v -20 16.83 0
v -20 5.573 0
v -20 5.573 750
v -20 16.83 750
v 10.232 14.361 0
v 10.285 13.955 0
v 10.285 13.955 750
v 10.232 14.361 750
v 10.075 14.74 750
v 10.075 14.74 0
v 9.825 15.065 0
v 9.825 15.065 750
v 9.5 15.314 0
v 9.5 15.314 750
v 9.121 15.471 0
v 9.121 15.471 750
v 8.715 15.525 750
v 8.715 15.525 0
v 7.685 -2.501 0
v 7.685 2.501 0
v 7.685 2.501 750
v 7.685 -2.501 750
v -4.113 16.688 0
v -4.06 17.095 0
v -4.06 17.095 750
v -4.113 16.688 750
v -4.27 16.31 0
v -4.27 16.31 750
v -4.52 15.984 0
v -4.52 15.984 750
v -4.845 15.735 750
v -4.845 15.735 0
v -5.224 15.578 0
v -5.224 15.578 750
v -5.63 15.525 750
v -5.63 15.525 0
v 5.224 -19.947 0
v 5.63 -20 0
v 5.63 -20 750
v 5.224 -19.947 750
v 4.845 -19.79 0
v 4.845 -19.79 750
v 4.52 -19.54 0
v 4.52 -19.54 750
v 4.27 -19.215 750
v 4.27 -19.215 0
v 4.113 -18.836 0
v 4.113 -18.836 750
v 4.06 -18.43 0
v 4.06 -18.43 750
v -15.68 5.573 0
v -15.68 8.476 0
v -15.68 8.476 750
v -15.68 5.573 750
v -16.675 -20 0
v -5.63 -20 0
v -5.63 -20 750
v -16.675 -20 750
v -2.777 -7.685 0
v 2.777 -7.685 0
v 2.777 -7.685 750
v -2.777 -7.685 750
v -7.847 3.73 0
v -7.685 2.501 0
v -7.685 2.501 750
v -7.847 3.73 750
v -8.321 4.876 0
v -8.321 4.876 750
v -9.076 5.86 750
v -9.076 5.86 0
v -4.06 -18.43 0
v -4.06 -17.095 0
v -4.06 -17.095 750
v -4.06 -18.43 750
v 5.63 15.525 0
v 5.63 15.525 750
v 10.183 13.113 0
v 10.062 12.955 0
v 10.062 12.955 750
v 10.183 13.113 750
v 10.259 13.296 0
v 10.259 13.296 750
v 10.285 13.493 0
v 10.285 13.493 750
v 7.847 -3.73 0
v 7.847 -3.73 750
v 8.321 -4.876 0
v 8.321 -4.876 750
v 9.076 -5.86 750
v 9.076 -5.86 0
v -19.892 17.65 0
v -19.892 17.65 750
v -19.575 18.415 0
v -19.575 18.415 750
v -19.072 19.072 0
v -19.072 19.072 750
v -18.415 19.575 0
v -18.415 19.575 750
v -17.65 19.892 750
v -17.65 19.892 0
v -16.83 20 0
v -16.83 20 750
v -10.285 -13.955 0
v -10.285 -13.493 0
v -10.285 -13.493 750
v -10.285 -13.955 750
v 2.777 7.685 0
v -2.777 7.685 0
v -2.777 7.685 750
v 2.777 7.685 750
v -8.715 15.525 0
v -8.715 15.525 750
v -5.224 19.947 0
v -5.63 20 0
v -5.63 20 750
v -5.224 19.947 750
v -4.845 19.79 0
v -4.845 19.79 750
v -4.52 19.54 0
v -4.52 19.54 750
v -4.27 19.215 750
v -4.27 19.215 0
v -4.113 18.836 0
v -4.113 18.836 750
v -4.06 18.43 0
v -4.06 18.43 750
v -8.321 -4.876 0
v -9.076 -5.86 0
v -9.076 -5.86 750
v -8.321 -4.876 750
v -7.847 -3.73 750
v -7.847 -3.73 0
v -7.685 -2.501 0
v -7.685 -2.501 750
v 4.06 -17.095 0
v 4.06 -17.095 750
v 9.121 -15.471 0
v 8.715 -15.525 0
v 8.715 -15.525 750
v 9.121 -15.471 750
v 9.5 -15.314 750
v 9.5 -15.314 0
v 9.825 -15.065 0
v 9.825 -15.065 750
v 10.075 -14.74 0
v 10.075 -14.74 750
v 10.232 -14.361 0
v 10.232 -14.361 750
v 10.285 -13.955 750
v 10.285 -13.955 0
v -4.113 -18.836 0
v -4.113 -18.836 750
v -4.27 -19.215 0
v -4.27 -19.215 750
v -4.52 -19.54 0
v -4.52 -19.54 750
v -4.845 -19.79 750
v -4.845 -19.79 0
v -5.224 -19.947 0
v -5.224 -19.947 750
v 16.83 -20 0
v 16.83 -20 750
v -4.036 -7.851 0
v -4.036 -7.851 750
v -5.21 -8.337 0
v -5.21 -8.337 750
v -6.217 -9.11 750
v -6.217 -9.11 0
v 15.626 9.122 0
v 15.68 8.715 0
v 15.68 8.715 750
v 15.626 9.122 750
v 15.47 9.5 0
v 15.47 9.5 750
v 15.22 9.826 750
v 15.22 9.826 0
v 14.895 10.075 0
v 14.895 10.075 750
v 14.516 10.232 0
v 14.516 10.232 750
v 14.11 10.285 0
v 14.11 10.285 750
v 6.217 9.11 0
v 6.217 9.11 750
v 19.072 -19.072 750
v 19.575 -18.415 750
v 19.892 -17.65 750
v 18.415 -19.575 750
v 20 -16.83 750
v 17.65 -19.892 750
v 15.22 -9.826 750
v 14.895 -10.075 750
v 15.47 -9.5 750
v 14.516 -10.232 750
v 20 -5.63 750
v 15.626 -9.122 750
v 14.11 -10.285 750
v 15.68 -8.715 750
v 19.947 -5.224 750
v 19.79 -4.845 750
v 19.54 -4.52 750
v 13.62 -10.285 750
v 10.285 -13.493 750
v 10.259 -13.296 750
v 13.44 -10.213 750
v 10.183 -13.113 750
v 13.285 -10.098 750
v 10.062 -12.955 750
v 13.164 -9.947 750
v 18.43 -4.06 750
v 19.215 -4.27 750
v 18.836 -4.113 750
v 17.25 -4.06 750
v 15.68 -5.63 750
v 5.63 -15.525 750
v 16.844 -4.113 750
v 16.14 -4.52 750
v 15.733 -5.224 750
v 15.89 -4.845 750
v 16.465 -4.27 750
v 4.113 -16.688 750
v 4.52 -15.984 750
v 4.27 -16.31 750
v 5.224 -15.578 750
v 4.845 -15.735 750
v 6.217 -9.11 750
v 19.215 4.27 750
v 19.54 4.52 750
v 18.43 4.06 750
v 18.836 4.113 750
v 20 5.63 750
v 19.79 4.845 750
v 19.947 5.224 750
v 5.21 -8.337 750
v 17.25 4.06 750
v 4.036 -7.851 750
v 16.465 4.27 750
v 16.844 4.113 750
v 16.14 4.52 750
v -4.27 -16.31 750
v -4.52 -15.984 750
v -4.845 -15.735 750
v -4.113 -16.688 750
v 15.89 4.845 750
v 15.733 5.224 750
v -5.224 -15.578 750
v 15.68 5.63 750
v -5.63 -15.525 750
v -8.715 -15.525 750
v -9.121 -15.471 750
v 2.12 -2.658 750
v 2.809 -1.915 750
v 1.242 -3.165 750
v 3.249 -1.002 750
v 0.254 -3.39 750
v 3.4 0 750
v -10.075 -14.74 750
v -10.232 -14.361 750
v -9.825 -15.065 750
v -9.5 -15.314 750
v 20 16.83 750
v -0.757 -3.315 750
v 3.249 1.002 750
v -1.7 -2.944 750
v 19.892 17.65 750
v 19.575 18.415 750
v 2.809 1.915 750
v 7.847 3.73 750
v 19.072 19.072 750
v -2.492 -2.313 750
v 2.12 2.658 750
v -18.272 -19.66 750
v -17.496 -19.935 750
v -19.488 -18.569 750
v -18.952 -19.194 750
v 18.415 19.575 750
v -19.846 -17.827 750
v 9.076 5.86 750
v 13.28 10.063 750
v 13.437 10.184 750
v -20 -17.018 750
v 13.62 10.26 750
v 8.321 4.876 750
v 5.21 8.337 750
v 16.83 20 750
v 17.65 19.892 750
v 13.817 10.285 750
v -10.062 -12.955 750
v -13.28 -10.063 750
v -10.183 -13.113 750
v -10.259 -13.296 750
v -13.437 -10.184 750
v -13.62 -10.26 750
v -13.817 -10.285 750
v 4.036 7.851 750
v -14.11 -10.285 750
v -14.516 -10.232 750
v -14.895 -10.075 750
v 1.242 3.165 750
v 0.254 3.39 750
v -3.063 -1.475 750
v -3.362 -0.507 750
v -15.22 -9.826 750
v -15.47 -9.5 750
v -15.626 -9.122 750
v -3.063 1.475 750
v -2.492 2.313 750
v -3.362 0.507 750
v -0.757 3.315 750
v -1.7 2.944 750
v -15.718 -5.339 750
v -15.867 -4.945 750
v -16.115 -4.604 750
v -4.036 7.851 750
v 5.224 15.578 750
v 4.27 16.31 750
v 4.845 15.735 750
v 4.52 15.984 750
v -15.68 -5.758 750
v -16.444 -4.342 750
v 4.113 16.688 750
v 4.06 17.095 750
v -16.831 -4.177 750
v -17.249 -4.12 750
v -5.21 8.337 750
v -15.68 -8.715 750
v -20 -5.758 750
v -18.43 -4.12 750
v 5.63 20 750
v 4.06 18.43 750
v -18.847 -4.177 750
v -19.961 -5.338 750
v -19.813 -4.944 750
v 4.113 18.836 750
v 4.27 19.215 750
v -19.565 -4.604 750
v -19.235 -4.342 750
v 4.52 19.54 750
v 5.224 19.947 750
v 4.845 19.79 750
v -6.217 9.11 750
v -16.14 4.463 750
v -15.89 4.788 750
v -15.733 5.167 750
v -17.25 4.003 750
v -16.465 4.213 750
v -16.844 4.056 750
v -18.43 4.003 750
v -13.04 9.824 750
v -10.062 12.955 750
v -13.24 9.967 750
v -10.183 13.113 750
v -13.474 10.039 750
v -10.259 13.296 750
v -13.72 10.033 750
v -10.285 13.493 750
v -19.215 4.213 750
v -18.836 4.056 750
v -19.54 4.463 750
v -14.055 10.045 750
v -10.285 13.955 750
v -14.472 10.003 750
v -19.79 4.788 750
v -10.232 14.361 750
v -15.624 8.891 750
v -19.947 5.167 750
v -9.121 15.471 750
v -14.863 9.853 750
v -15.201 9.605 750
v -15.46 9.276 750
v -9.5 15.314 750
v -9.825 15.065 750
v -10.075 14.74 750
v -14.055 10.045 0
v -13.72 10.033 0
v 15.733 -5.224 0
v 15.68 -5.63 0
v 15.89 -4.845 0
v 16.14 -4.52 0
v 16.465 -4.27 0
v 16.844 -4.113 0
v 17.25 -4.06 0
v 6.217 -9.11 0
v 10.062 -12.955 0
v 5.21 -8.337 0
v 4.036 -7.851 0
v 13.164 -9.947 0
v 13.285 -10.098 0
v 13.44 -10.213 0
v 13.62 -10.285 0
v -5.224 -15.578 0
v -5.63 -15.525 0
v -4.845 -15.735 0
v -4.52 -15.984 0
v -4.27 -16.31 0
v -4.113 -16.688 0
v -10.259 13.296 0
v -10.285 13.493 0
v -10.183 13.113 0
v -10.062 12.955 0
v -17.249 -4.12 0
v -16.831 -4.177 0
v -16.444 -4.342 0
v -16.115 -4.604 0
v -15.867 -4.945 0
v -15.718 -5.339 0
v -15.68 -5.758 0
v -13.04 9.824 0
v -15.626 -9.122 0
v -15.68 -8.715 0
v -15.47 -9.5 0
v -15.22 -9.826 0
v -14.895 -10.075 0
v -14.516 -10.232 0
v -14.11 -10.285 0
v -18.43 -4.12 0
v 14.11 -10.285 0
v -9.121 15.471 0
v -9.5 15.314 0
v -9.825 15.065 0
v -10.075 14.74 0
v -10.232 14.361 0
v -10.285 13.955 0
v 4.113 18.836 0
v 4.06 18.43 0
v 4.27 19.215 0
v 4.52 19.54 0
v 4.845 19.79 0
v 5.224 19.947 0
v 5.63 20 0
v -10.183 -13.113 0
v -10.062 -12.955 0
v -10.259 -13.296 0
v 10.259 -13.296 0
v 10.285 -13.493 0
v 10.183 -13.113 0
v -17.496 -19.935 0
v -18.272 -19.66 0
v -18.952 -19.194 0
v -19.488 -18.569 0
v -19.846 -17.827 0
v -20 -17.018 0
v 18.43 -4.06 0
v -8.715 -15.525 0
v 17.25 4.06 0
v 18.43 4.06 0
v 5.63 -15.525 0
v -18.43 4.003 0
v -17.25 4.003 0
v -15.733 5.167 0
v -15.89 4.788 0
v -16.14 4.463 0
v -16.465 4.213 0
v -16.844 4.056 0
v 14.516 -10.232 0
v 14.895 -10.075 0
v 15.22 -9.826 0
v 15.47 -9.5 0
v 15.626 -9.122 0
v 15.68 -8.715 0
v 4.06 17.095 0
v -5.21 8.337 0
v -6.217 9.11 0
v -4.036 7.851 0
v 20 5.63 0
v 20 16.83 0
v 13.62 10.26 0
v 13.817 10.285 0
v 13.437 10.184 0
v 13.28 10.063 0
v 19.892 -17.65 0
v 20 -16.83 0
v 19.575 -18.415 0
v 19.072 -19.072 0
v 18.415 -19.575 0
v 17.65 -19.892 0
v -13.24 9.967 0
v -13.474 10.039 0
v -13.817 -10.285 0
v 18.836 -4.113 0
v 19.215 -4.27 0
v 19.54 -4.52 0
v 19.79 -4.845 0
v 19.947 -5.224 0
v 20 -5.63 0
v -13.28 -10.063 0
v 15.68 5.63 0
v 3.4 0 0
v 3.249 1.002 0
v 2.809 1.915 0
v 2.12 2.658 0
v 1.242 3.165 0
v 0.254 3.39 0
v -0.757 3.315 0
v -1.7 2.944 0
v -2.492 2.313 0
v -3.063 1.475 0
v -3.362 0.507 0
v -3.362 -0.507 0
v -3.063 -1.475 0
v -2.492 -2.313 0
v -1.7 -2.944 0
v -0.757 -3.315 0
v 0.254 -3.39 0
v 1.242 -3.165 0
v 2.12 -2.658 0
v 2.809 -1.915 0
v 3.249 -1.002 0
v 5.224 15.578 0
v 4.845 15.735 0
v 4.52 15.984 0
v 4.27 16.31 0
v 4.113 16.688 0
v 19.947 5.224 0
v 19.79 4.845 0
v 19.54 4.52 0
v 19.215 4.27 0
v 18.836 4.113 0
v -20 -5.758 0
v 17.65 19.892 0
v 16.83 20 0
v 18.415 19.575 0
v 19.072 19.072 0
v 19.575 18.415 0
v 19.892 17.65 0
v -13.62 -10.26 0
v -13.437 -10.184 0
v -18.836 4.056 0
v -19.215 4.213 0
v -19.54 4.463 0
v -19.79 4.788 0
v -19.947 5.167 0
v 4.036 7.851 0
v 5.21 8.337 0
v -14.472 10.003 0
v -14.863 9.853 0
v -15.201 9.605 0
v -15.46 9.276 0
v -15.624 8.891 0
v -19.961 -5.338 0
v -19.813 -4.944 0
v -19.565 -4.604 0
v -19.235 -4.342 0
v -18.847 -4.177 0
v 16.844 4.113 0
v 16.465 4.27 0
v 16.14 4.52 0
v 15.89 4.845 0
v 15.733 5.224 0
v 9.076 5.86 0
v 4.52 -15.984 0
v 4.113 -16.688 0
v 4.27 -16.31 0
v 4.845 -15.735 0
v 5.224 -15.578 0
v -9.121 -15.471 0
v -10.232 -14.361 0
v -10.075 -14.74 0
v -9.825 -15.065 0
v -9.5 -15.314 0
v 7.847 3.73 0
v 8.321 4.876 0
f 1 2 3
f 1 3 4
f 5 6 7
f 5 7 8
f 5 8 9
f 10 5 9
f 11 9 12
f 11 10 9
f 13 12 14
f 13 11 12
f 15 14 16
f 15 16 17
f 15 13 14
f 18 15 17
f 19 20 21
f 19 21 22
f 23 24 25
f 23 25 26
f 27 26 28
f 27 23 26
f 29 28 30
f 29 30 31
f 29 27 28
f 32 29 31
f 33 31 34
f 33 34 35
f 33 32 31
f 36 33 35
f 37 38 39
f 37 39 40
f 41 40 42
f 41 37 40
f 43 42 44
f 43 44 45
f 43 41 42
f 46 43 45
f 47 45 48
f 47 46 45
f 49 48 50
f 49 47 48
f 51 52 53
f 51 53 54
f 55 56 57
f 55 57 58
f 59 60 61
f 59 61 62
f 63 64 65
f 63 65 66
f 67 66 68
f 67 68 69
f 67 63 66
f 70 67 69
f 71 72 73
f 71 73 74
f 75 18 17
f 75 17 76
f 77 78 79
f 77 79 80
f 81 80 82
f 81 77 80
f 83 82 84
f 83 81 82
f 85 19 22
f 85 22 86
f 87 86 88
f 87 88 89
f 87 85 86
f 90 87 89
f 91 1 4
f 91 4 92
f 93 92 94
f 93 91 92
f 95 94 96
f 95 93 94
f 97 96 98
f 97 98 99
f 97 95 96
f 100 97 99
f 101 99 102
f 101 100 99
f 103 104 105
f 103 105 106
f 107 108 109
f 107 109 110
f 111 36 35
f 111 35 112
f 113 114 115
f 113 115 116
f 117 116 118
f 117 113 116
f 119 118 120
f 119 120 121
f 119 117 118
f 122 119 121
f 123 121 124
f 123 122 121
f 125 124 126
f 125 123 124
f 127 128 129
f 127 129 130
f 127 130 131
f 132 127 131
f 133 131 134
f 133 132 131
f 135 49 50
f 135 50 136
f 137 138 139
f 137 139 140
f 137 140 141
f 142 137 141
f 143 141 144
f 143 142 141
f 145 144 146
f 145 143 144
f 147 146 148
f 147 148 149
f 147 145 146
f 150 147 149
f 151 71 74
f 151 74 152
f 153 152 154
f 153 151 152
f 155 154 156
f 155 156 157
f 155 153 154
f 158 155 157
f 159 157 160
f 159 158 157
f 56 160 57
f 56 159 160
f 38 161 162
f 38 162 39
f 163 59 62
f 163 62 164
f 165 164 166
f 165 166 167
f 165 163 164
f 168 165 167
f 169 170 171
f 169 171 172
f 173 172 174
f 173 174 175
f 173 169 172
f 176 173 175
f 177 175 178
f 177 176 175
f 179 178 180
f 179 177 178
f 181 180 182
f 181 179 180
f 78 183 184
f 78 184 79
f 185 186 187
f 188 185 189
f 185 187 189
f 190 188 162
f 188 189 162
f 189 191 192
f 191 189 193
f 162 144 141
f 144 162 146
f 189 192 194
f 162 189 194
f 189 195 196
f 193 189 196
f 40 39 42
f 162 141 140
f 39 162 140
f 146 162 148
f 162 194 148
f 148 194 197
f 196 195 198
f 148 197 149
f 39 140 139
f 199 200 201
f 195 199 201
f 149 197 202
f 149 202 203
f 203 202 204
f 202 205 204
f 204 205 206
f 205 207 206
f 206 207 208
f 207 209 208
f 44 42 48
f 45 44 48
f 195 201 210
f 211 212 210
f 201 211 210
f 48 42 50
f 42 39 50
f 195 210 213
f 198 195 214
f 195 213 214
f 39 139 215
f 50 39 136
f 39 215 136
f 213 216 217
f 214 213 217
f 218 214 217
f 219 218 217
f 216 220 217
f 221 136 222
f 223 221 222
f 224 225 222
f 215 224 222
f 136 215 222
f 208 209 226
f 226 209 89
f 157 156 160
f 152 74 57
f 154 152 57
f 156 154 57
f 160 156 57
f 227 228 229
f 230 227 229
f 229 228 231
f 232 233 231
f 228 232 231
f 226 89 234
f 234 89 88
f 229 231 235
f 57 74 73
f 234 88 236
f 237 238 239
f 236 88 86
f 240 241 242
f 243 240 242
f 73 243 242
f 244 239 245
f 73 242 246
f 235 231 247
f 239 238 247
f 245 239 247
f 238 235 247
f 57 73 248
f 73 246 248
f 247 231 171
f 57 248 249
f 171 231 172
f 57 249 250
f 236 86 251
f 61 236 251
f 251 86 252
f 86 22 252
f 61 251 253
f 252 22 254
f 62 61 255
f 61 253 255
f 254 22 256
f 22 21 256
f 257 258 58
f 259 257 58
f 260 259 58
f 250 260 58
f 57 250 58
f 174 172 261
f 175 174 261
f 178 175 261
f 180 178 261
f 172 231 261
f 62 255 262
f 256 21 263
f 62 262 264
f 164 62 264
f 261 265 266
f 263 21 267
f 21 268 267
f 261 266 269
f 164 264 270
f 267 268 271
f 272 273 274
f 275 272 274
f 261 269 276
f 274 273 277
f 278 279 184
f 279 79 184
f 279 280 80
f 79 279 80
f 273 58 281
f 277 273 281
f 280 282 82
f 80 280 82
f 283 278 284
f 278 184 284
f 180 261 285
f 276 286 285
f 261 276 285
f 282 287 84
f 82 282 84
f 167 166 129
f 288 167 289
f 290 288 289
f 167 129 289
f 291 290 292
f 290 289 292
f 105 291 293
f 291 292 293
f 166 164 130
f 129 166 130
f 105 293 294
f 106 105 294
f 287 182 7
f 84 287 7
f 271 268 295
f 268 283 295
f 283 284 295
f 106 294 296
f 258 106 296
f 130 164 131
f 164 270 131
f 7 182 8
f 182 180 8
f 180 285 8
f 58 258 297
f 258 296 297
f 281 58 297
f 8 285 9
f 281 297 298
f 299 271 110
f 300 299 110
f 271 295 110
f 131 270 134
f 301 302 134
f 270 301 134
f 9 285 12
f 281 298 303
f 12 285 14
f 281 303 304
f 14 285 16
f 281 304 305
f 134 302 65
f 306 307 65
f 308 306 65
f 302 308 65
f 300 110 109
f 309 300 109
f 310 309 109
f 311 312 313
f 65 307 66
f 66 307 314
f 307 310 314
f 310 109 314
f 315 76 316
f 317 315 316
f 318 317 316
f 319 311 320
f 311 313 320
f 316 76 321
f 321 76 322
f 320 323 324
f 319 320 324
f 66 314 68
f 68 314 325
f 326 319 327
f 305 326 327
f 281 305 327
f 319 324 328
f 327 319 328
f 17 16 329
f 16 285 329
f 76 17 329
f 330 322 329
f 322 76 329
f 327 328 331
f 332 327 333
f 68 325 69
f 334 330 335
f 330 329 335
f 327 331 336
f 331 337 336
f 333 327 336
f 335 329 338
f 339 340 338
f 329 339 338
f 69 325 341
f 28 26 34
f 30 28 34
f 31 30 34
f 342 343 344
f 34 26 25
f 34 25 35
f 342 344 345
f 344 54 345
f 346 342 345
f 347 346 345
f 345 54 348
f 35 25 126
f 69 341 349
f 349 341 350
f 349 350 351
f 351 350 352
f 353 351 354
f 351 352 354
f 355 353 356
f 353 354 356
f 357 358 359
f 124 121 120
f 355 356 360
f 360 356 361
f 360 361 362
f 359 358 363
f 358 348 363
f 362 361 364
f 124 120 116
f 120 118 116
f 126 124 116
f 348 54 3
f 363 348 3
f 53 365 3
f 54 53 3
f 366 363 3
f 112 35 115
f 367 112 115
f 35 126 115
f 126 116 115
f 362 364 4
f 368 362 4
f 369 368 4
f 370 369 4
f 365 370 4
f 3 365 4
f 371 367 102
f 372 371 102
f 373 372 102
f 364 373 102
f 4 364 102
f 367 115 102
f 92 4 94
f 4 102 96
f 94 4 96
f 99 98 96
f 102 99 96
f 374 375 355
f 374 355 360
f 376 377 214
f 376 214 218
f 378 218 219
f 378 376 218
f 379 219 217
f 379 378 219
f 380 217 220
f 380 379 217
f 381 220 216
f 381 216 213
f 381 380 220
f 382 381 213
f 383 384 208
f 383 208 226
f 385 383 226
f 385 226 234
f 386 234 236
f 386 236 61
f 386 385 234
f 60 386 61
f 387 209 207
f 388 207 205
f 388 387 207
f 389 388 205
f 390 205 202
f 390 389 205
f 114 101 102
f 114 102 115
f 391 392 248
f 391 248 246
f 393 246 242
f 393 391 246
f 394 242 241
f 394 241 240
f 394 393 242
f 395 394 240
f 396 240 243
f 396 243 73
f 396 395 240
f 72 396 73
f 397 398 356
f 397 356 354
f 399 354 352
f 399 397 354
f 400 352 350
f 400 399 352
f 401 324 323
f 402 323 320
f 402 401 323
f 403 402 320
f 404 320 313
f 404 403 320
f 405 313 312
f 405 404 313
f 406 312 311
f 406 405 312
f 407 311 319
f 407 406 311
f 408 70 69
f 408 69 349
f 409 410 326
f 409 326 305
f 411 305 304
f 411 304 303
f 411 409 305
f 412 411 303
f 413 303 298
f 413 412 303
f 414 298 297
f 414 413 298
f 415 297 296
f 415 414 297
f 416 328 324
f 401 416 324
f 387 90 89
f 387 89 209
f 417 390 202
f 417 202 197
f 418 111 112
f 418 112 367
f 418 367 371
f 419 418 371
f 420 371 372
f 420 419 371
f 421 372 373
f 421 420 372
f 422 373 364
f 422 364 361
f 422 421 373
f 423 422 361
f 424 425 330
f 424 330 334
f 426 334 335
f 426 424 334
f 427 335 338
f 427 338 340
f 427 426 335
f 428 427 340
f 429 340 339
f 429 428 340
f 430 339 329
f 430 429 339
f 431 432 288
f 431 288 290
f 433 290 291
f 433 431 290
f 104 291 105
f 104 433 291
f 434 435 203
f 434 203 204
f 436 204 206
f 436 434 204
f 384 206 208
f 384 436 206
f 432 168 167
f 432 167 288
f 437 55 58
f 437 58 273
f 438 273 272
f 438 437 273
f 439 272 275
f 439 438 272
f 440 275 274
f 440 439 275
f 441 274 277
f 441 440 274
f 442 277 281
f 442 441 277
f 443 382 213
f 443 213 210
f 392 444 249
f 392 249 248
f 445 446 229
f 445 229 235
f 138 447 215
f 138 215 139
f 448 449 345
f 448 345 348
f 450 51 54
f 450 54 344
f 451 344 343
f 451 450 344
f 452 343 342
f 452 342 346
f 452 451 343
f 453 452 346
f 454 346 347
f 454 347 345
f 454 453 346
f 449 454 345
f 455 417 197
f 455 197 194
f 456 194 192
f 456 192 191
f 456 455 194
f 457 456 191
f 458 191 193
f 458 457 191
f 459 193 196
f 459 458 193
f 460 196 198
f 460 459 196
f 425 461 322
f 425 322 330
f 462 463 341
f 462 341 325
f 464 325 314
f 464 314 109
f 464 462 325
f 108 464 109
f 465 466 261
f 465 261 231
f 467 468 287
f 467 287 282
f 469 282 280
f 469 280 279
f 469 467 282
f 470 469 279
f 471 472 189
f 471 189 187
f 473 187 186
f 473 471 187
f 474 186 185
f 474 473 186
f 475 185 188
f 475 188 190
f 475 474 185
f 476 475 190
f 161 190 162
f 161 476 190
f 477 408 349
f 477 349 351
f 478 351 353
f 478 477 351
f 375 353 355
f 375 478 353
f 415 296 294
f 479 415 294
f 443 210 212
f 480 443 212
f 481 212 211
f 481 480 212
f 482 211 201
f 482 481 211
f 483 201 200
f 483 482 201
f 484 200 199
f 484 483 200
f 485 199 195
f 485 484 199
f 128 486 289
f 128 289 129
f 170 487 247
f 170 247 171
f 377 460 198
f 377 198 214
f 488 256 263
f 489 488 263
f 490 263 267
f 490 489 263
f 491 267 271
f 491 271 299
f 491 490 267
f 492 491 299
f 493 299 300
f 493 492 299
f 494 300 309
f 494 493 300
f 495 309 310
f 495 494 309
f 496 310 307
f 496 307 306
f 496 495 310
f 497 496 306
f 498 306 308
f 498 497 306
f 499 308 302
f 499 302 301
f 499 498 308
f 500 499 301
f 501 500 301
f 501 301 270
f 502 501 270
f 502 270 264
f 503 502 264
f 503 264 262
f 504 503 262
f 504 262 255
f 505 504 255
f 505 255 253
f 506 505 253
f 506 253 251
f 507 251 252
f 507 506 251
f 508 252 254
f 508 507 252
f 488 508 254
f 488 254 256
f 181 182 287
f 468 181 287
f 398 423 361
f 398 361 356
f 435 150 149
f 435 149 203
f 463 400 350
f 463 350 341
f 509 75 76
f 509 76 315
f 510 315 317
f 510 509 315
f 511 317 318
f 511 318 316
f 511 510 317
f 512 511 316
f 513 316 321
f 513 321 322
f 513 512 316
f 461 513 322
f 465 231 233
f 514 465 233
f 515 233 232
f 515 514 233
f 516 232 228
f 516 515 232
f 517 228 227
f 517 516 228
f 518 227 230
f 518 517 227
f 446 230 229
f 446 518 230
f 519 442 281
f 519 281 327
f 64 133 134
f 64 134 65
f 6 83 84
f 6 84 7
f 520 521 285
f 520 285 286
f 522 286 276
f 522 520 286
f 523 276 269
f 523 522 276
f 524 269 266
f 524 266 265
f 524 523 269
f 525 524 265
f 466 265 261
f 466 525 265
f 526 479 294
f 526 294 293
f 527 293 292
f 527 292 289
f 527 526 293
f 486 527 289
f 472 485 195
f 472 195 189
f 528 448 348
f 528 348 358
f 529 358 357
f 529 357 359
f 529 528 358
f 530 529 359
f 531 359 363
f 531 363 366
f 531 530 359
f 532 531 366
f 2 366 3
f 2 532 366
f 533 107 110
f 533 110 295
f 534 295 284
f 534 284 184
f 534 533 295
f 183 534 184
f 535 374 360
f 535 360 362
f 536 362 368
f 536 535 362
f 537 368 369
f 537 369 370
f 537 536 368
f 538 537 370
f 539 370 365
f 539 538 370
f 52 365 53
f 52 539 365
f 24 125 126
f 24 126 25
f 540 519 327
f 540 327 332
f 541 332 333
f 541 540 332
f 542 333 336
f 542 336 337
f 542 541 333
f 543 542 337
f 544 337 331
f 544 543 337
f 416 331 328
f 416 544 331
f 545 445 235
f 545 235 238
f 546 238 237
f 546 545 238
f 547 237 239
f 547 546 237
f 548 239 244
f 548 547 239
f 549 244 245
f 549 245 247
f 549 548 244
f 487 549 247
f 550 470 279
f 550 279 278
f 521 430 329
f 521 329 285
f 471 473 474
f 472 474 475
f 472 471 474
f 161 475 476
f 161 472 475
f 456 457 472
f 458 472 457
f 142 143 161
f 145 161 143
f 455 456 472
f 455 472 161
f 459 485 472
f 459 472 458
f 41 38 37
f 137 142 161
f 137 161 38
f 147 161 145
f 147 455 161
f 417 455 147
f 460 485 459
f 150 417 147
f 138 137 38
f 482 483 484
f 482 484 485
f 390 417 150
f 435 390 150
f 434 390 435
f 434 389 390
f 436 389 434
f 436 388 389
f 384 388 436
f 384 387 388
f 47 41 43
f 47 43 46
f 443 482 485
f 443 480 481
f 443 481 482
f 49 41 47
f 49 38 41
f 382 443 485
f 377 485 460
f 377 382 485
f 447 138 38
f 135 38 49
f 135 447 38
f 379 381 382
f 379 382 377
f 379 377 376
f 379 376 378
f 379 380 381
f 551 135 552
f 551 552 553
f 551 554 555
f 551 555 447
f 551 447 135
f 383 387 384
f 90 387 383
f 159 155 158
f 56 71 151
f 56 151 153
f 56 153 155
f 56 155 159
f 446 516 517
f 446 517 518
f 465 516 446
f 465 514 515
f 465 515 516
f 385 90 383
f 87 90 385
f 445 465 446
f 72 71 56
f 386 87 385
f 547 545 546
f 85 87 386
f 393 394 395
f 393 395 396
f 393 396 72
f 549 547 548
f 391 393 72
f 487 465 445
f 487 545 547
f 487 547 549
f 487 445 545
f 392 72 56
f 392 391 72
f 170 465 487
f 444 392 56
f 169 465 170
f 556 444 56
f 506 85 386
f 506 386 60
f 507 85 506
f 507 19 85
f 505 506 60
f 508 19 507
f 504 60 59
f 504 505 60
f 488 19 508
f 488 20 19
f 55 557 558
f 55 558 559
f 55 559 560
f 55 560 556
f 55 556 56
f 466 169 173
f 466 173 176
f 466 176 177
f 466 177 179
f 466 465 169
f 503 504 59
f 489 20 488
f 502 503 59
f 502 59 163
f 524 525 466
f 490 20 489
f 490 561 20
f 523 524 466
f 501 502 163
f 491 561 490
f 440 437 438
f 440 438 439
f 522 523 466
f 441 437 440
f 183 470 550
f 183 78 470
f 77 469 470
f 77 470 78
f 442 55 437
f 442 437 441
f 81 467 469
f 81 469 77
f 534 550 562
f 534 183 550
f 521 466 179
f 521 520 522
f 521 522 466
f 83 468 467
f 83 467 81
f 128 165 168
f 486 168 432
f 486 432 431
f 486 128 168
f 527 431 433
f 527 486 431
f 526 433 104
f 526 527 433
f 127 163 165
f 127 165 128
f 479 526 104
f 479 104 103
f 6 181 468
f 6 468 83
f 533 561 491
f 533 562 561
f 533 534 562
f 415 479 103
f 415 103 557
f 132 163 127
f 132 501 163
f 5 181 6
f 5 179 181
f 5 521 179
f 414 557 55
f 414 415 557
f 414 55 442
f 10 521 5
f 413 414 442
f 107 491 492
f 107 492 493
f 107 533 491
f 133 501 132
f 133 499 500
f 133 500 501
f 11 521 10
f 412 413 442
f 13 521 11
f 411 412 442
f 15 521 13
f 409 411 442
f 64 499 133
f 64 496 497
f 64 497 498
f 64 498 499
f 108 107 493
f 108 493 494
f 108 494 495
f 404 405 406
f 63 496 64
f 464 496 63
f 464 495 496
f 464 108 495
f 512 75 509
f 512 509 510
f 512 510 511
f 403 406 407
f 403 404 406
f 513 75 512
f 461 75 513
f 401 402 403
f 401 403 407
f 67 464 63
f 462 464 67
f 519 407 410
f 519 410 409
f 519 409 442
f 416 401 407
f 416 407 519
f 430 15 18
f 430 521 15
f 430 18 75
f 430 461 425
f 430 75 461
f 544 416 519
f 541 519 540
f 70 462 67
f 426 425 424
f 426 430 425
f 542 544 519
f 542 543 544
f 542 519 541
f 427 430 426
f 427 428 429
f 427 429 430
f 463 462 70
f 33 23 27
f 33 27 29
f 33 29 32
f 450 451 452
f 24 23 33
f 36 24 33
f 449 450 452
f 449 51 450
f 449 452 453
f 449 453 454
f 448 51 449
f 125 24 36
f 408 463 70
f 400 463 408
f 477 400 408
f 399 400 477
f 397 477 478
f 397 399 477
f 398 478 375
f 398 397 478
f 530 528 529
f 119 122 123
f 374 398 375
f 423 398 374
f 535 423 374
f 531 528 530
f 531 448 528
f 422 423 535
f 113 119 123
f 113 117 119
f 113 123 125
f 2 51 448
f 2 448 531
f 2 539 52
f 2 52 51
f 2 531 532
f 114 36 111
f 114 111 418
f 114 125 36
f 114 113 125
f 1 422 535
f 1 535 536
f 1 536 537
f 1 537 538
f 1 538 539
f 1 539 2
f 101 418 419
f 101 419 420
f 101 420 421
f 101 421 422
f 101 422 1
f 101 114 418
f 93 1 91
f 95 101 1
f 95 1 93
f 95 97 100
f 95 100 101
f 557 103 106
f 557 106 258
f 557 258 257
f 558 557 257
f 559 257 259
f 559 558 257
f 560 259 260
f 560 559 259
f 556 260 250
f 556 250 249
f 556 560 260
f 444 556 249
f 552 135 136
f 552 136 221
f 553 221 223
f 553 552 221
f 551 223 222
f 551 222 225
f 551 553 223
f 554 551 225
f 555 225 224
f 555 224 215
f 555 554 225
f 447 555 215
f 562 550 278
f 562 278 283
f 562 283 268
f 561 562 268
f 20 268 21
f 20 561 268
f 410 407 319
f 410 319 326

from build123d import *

# Parameters (mm, degrees)
SKETCH1_R           = 3.4
BOSS_EXTRUDE1_DEPTH = 750


with BuildPart() as part:
    # Sketch1 → Boss-Extrude1 (new body)
    with BuildSketch(Plane.XY):
        with BuildLine():
            Line((-8.715, -15.524615034), (-5.63, -15.524615034))
            ThreePointArc((-5.63, -15.524615034), (-4.519842354, -15.984457388), (-4.06, -17.094615034))
            Line((-4.06, -17.094615034), (-4.06, -18.43))
            ThreePointArc((-4.06, -18.43), (-4.519842354, -19.540157646), (-5.63, -20))
            Line((-5.63, -20), (-16.674615034, -20))
            ThreePointArc((-16.674615034, -20), (-18.951578385, -19.194274381), (-20, -17.018368134))
            Line((-20, -17.018368134), (-20, -5.757918808))
            ThreePointArc((-20, -5.757918808), (-19.564709668, -4.603883664), (-18.43, -4.120449326))
            Line((-18.43, -4.120449326), (-17.248545805, -4.120449326))
            ThreePointArc((-17.248545805, -4.120449326), (-16.114784845, -4.604407881), (-15.67999625, -5.757919334))
            Line((-15.67999625, -5.757919334), (-15.67999625, -8.715399492))
            ThreePointArc((-15.67999625, -8.715399492), (-15.220153896, -9.825557139), (-14.10999625, -10.285399492))
            Line((-14.10999625, -10.285399492), (-13.816903094, -10.285399492))
            ThreePointArc((-13.816903094, -10.285399492), (-13.526063686, -10.227547937), (-13.279501941, -10.062800646))
            Line((-13.279501941, -10.062800646), (-9.076242789, -5.859541495))
            ThreePointArc((-9.076242789, -5.859541495), (-8.046572221, -4.318530588), (-7.685, -2.500784284))
            Line((-7.685, -2.500784284), (-7.685, 2.500784284))
            ThreePointArc((-7.685, 2.500784284), (-8.046572221, 4.318530588), (-9.076242789, 5.859541495))
            Line((-9.076242789, 5.859541495), (-13.040489136, 9.823787841))
            ThreePointArc((-13.040489136, 9.823787841), (-13.354224618, 10.012729352), (-13.71989919, 10.033001362))
            Line((-13.71989919, 10.033001362), (-14.05520779, 10.044710596))
            ThreePointArc((-14.05520779, 10.044710596), (-15.200613642, 9.605030484), (-15.68, 8.475666998))
            Line((-15.68, 8.475666998), (-15.68, 5.572979049))
            ThreePointArc((-15.68, 5.572979049), (-16.139842354, 4.462821403), (-17.25, 4.002979049))
            Line((-17.25, 4.002979049), (-18.43, 4.002979049))
            ThreePointArc((-18.43, 4.002979049), (-19.540157646, 4.462821403), (-20, 5.572979049))
            Line((-20, 5.572979049), (-20, 13.004526564))
            Line((-20, 13.004526564), (-20, 16.83))
            ThreePointArc((-20, 16.83), (-19.071528496, 19.071528496), (-16.83, 20))
            Line((-16.83, 20), (-5.63, 20))
            ThreePointArc((-5.63, 20), (-4.519842354, 19.540157646), (-4.06, 18.43))
            Line((-4.06, 18.43), (-4.06, 17.094615034))
            ThreePointArc((-4.06, 17.094615034), (-4.519842354, 15.984457388), (-5.63, 15.524615034))
            Line((-5.63, 15.524615034), (-8.715, 15.524615034))
            ThreePointArc((-8.715, 15.524615034), (-9.825157646, 15.06477268), (-10.285, 13.954615034))
            Line((-10.285, 13.954615034), (-10.285, 13.492503602))
            ThreePointArc((-10.285, 13.492503602), (-10.227148445, 13.201664194), (-10.062401154, 12.955102448))
            Line((-10.062401154, 12.955102448), (-6.217092793, 9.109794088))
            ThreePointArc((-6.217092793, 9.109794088), (-4.63891877, 8.055291919), (-2.777335583, 7.685))
            Line((-2.777335583, 7.685), (2.777335583, 7.685))
            ThreePointArc((2.777335583, 7.685), (4.63891877, 8.055291919), (6.217092793, 9.109794088))
            Line((6.217092793, 9.109794088), (10.062401154, 12.955102448))
            ThreePointArc((10.062401154, 12.955102448), (10.227148445, 13.201664194), (10.285, 13.492503602))
            Line((10.285, 13.492503602), (10.285, 13.954615034))
            ThreePointArc((10.285, 13.954615034), (9.825157646, 15.06477268), (8.715, 15.524615034))
            Line((8.715, 15.524615034), (5.63, 15.524615034))
            ThreePointArc((5.63, 15.524615034), (4.519842354, 15.984457388), (4.06, 17.094615034))
            Line((4.06, 17.094615034), (4.06, 18.43))
            ThreePointArc((4.06, 18.43), (4.519842354, 19.540157646), (5.63, 20))
            Line((5.63, 20), (12.979635074, 20))
            Line((12.979635074, 20), (16.83, 20))
            ThreePointArc((16.83, 20), (19.071528496, 19.071528496), (20, 16.83))
            Line((20, 16.83), (20, 13.001098436))
            Line((20, 13.001098436), (20, 5.630000526))
            ThreePointArc((20, 5.630000526), (19.540157646, 4.519842879), (18.43, 4.060000526))
            Line((18.43, 4.060000526), (17.24999625, 4.060000526))
            ThreePointArc((17.24999625, 4.060000526), (16.139838603, 4.519842879), (15.67999625, 5.630000526))
            Line((15.67999625, 5.630000526), (15.67999625, 8.715399492))
            ThreePointArc((15.67999625, 8.715399492), (15.220153896, 9.825557139), (14.10999625, 10.285399492))
            Line((14.10999625, 10.285399492), (13.816903094, 10.285399492))
            ThreePointArc((13.816903094, 10.285399492), (13.526063686, 10.227547937), (13.279501941, 10.062800646))
            Line((13.279501941, 10.062800646), (9.076242789, 5.859541495))
            ThreePointArc((9.076242789, 5.859541495), (8.046572221, 4.318530588), (7.685, 2.500784284))
            Line((7.685, 2.500784284), (7.685, -2.500784284))
            ThreePointArc((7.685, -2.500784284), (8.046572221, -4.318530588), (9.076242789, -5.859541495))
            Line((9.076242789, -5.859541495), (13.163657296, -9.946956002))
            ThreePointArc((13.163657296, -9.946956002), (13.35903797, -10.160433474), (13.6200547, -10.285399492))
            Line((13.6200547, -10.285399492), (14.10999625, -10.285399492))
            ThreePointArc((14.10999625, -10.285399492), (15.220153896, -9.825557139), (15.67999625, -8.715399492))
            Line((15.67999625, -8.715399492), (15.67999625, -5.630000526))
            ThreePointArc((15.67999625, -5.630000526), (16.139838603, -4.519842879), (17.24999625, -4.060000526))
            Line((17.24999625, -4.060000526), (18.43, -4.060000526))
            ThreePointArc((18.43, -4.060000526), (19.540157646, -4.519842879), (20, -5.630000526))
            Line((20, -5.630000526), (20, -16.83))
            ThreePointArc((20, -16.83), (19.071528496, -19.071528496), (16.83, -20))
            Line((16.83, -20), (13, -20))
            Line((13, -20), (5.63, -20))
            ThreePointArc((5.63, -20), (4.519842354, -19.540157646), (4.06, -18.43))
            Line((4.06, -18.43), (4.06, -17.094615034))
            ThreePointArc((4.06, -17.094615034), (4.519842354, -15.984457388), (5.63, -15.524615034))
            Line((5.63, -15.524615034), (8.715, -15.524615034))
            ThreePointArc((8.715, -15.524615034), (9.825157646, -15.06477268), (10.285, -13.954615034))
            Line((10.285, -13.954615034), (10.285, -13.492503602))
            ThreePointArc((10.285, -13.492503602), (10.227148445, -13.201664194), (10.062401154, -12.955102448))
            Line((10.062401154, -12.955102448), (6.217092793, -9.109794088))
            ThreePointArc((6.217092793, -9.109794088), (4.63891877, -8.055291919), (2.777335583, -7.685))
            Line((2.777335583, -7.685), (-2.777335583, -7.685))
            ThreePointArc((-2.777335583, -7.685), (-4.63891877, -8.055291919), (-6.217092793, -9.109794088))
            Line((-6.217092793, -9.109794088), (-10.062401154, -12.955102448))
            ThreePointArc((-10.062401154, -12.955102448), (-10.227148445, -13.201664194), (-10.285, -13.492503602))
            Line((-10.285, -13.492503602), (-10.285, -13.954615034))
            ThreePointArc((-10.285, -13.954615034), (-9.825157646, -15.06477268), (-8.715, -15.524615034))
        make_face()
        Circle(SKETCH1_R, mode=Mode.SUBTRACT)
    extrude(amount=BOSS_EXTRUDE1_DEPTH)


solid = part.part
